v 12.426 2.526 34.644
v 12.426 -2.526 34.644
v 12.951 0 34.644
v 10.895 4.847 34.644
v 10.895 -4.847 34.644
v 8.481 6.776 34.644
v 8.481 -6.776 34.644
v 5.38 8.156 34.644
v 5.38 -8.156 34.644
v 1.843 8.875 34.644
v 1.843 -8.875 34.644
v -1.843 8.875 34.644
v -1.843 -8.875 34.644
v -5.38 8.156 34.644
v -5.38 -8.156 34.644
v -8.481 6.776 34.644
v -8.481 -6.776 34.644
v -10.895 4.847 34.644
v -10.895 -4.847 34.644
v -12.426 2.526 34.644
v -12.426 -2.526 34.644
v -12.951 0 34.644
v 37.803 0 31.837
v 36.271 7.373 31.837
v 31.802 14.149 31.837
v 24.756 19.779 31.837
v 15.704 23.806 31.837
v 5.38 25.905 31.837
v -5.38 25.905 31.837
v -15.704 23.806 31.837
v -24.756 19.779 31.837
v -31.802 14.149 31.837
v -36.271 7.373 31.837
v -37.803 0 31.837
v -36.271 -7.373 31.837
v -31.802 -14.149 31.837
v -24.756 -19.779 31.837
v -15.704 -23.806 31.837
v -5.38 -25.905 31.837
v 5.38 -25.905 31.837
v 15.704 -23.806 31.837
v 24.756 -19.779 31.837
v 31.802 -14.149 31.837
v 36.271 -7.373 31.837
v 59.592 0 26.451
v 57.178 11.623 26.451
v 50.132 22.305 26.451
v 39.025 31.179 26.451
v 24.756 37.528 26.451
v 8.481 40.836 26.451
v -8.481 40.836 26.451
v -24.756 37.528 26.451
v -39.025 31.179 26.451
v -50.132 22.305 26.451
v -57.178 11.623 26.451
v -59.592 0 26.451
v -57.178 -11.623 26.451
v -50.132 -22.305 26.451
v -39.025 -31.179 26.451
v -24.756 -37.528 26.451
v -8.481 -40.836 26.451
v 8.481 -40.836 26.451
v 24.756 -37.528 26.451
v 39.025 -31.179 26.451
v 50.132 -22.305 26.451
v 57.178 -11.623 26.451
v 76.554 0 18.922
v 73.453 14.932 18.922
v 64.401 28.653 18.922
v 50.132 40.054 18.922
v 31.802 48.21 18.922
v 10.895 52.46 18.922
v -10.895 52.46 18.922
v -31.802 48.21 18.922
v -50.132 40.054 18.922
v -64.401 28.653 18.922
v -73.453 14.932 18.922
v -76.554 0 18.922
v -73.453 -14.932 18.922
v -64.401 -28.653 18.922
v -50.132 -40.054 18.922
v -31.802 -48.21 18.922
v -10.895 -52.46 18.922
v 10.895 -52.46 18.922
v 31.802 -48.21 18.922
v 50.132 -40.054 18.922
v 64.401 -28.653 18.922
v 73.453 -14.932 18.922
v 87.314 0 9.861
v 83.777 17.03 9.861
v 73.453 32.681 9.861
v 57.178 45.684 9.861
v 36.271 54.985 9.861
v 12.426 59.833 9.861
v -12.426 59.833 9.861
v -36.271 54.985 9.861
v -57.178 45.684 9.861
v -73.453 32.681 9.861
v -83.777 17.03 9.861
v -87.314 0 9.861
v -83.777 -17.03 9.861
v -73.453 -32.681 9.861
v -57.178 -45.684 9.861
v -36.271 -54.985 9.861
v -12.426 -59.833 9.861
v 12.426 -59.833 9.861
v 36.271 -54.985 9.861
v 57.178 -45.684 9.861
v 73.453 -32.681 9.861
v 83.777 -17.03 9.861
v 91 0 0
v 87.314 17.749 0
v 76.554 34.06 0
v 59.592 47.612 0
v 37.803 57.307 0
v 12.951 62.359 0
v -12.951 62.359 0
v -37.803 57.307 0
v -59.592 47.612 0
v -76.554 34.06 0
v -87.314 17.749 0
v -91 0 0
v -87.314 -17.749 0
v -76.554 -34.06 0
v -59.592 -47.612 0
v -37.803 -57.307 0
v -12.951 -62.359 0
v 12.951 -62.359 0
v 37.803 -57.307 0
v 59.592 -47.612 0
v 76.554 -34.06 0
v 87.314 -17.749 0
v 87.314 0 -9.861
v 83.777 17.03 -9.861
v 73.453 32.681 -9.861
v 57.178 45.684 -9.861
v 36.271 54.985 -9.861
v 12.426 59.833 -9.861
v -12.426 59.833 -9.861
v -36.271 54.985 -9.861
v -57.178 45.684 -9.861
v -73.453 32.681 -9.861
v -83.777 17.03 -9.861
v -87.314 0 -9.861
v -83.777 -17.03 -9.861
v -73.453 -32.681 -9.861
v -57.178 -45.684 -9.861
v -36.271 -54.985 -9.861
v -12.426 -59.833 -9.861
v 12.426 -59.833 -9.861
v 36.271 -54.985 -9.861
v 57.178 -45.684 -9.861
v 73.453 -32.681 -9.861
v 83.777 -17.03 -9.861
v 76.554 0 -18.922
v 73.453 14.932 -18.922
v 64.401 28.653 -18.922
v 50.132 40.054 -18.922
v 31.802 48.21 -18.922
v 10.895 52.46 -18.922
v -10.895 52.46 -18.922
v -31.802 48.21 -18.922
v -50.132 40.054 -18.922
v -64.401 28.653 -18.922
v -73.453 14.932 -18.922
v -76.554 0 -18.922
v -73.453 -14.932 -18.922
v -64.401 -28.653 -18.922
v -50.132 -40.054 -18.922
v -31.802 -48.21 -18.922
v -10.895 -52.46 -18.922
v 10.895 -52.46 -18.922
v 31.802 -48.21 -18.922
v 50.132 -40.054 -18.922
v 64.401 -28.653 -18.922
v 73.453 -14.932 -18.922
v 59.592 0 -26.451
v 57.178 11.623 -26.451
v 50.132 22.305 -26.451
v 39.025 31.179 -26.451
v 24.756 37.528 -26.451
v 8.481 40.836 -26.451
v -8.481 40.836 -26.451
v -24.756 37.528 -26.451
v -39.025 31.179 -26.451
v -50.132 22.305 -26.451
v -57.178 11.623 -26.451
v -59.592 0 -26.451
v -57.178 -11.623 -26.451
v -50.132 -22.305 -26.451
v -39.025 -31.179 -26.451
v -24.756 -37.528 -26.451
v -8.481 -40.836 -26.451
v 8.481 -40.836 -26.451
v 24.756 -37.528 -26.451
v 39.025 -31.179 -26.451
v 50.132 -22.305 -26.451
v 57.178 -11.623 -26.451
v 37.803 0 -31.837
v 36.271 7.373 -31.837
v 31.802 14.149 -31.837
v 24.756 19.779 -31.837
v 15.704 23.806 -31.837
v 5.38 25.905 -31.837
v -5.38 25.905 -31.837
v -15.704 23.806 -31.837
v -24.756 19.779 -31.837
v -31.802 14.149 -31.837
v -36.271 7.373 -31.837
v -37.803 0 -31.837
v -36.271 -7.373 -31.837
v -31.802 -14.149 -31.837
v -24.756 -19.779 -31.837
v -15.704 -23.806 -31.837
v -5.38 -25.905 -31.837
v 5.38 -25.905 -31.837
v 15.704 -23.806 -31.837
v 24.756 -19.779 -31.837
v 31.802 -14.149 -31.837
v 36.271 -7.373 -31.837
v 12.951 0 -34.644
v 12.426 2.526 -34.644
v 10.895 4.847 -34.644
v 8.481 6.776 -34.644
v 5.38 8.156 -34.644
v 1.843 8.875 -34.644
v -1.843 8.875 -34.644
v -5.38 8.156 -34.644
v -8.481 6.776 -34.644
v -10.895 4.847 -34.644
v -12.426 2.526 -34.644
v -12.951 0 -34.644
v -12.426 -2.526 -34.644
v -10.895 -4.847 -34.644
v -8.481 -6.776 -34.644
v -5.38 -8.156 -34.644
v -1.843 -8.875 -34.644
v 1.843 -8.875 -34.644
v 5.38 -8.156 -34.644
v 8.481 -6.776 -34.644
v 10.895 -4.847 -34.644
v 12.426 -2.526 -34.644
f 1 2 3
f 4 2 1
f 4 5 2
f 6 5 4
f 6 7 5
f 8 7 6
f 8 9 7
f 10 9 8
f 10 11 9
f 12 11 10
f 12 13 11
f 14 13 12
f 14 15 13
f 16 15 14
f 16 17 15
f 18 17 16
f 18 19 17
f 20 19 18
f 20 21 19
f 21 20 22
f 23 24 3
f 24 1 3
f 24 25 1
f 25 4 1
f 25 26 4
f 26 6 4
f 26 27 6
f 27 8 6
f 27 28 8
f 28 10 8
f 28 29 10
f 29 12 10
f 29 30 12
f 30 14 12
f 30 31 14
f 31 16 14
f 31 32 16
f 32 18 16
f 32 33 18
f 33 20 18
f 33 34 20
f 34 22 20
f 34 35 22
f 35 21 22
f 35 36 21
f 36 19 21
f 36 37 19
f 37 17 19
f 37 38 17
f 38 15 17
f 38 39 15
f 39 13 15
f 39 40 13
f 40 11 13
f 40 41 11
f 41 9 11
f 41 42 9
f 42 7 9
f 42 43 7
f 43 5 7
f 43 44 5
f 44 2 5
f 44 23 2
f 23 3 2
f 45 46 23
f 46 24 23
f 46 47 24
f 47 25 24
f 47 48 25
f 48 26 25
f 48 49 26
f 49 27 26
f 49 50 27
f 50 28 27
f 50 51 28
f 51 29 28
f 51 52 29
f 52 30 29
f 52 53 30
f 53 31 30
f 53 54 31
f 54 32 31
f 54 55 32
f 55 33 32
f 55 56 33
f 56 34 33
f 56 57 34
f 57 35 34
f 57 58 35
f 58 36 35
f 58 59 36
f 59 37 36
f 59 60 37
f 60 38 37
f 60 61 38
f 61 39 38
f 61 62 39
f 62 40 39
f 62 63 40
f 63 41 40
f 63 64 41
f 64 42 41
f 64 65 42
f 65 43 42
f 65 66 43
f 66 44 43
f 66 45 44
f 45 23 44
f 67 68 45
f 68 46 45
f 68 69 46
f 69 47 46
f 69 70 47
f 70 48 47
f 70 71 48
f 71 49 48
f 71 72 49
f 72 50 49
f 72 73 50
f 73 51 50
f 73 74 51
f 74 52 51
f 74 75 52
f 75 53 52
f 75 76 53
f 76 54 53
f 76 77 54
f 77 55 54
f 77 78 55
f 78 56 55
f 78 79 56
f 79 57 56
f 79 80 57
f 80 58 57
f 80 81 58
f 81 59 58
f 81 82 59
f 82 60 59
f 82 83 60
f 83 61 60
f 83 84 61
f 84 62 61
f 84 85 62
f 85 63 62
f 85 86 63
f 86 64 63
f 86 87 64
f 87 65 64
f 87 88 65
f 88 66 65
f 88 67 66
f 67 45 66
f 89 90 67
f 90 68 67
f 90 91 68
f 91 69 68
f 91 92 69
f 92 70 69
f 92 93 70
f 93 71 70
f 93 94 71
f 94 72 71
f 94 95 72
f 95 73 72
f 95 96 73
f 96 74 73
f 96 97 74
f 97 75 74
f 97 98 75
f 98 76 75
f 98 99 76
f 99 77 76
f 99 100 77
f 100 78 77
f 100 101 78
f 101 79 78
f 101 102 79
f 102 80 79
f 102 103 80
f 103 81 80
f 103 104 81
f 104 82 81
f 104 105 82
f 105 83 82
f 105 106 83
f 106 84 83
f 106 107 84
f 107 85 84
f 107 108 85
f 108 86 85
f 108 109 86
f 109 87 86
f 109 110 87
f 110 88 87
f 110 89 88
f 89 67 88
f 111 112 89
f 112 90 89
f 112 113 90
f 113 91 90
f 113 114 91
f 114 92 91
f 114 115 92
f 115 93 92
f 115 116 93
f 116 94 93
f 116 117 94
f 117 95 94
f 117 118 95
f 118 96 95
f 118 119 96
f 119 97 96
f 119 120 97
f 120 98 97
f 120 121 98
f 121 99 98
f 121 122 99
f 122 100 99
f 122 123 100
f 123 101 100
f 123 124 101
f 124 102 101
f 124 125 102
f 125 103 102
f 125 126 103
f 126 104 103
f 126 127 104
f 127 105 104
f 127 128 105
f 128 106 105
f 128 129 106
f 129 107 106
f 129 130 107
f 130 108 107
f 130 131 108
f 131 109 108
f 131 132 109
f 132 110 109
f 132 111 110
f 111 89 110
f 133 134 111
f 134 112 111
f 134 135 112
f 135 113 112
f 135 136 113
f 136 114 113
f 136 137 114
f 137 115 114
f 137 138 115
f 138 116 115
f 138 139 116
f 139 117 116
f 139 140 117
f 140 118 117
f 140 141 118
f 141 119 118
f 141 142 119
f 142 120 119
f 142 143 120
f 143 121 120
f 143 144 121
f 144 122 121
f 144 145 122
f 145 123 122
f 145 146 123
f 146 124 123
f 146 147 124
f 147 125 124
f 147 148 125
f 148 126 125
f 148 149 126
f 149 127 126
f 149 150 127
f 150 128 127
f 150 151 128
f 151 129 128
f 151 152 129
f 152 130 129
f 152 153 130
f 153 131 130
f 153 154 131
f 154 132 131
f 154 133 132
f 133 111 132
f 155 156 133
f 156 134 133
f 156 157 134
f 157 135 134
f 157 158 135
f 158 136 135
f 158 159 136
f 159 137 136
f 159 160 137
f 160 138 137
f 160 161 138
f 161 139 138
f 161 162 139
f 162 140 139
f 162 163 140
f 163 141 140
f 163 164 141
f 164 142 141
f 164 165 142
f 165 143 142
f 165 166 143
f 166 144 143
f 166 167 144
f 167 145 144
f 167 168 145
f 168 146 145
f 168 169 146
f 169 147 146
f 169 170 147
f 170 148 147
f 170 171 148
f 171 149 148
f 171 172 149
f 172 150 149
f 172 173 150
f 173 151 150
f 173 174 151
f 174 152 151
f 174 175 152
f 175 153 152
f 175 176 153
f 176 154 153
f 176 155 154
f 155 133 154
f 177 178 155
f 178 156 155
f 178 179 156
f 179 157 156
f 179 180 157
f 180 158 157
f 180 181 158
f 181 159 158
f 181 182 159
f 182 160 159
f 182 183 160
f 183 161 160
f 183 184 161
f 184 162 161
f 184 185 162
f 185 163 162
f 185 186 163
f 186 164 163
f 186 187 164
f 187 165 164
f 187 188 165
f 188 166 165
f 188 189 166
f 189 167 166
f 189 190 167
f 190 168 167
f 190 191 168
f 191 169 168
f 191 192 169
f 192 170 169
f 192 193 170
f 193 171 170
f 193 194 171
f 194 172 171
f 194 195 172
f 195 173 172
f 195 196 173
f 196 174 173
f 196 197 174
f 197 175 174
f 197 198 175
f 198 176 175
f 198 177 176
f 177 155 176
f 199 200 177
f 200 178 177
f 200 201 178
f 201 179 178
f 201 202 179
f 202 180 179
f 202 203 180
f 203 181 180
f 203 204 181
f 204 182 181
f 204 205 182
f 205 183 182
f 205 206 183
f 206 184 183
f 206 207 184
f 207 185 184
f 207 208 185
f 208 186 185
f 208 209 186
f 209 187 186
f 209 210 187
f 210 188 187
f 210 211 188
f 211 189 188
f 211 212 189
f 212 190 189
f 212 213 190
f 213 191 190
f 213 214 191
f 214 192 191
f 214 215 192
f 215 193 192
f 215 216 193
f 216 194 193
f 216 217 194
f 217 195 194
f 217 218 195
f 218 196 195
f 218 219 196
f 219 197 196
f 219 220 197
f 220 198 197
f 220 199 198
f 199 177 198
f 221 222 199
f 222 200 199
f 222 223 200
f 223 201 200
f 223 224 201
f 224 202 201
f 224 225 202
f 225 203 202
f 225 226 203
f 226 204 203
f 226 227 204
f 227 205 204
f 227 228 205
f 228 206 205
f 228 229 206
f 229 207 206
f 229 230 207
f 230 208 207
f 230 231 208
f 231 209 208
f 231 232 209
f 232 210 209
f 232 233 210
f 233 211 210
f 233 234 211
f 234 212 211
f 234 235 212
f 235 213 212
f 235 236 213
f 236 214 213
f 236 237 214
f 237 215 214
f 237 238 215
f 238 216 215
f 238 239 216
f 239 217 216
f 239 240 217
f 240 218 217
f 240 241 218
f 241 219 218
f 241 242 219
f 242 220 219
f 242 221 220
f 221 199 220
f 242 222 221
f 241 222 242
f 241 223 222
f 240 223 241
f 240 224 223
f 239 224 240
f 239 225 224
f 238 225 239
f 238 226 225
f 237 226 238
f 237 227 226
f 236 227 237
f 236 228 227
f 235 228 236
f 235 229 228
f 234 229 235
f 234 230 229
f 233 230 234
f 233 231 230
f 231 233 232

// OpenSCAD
// Generated by SolidPython 1.0.1 on 2020-07-29 00:46:50


scale(v = [13, 9, 5]) {
	sphere(r = 7);
}
/***********************************************
*********      SolidPython code:      **********
************************************************
 
# import packages: SolidPython
from solid import *
from solid.utils import *
from itertools import chain, combinations, permutations


class Resize:

    def __init__(self, scad_file):
        self.scad_file = scad_file
        #self.scad_file = import_scad(scad_file)
        # cone/cylinder param:
        self.r1 = 0
        self.r2 = 0
        self.h = 0
        # rectangular prism param:
        self.w = 0
        self.l = 0
        # ellipse param:
        self.r = 0

    # import OpenScad code (file name corresponds to shape)


    # classify shape + parameters
    def assign(self, param1, param2, param3):
        if self.scad_file == 'cone.scad':
            self.r1 = param1
            self.r2 = param2
            self.h = param3
        elif self.scad_file == 'cylinder.scad':
            self.r1 = param1
            self.r2 = param2
            self.h = param3
        elif self.scad_file == 'rectangularPrism.scad':
            self.h = param1
            self.l = param2
            self.w = param3
        else:
            self.r = param1
            self.h = param2

    # resize parameters
    def iterate(self):
        x = range(3, 20, 2)
        i = 1
        if self.scad_file == 'cone.scad':
            tempList = list(permutations(x, 2))
            for temp in tempList:
                param1 = temp[0]
                param2 = temp[1]
                filepath = 'produced_scad_files/' + 'cone' + str(param1) + '_' + str(param2) + '_' + '.scad'
                scad_render_to_file(cylinder(h=param1, r1=param2, r2=0), filepath)

        elif self.scad_file == 'cylinder.scad':
            tempList = list(permutations(x, 3))
            for temp in tempList:
                param1 = temp[0]
                param2 = temp[1]
                filepath = 'produced_scad_files/' + 'cylinder' + str(param1) + '_' + str(param2) + '_' + '.scad'
                scad_render_to_file(cylinder(h=param1, r1=param2, r2=param2), filepath)

        elif self.scad_file == 'rectangularPrism.scad':
            tempList = list(permutations(x, 3))
            for temp in tempList:
                param1 = temp[0]
                param2 = temp[1]
                param3 = temp[2]
                filepath = 'produced_scad_files/' + 'rectangularPrism' + str(param1) + '_' + str(param2) + '_' + str(
                    param3) + '.scad'
                scad_render_to_file(cube(size=(param1, param2, param3)), filepath)

        elif self.scad_file == 'ellipse.scad':
            tempList = list(permutations(x, 4))
            for temp in tempList:
                param1 = temp[0]
                param2 = temp[1]
                param3 = temp[2]
                param4 = temp[3]
                filepath = 'produced_scad_files/' + 'ellipse' + str(param1) + '_' + str(param2) + '_' + str(param3) + '_' + str(param4) + '.scad'
                scad_render_to_file(scale([param1, param2, param3])(sphere(r=param4)), filepath)

    def render_to_scadfile(self):
        scad_render_to_file(scad, 'example.scad') 
 
************************************************/
